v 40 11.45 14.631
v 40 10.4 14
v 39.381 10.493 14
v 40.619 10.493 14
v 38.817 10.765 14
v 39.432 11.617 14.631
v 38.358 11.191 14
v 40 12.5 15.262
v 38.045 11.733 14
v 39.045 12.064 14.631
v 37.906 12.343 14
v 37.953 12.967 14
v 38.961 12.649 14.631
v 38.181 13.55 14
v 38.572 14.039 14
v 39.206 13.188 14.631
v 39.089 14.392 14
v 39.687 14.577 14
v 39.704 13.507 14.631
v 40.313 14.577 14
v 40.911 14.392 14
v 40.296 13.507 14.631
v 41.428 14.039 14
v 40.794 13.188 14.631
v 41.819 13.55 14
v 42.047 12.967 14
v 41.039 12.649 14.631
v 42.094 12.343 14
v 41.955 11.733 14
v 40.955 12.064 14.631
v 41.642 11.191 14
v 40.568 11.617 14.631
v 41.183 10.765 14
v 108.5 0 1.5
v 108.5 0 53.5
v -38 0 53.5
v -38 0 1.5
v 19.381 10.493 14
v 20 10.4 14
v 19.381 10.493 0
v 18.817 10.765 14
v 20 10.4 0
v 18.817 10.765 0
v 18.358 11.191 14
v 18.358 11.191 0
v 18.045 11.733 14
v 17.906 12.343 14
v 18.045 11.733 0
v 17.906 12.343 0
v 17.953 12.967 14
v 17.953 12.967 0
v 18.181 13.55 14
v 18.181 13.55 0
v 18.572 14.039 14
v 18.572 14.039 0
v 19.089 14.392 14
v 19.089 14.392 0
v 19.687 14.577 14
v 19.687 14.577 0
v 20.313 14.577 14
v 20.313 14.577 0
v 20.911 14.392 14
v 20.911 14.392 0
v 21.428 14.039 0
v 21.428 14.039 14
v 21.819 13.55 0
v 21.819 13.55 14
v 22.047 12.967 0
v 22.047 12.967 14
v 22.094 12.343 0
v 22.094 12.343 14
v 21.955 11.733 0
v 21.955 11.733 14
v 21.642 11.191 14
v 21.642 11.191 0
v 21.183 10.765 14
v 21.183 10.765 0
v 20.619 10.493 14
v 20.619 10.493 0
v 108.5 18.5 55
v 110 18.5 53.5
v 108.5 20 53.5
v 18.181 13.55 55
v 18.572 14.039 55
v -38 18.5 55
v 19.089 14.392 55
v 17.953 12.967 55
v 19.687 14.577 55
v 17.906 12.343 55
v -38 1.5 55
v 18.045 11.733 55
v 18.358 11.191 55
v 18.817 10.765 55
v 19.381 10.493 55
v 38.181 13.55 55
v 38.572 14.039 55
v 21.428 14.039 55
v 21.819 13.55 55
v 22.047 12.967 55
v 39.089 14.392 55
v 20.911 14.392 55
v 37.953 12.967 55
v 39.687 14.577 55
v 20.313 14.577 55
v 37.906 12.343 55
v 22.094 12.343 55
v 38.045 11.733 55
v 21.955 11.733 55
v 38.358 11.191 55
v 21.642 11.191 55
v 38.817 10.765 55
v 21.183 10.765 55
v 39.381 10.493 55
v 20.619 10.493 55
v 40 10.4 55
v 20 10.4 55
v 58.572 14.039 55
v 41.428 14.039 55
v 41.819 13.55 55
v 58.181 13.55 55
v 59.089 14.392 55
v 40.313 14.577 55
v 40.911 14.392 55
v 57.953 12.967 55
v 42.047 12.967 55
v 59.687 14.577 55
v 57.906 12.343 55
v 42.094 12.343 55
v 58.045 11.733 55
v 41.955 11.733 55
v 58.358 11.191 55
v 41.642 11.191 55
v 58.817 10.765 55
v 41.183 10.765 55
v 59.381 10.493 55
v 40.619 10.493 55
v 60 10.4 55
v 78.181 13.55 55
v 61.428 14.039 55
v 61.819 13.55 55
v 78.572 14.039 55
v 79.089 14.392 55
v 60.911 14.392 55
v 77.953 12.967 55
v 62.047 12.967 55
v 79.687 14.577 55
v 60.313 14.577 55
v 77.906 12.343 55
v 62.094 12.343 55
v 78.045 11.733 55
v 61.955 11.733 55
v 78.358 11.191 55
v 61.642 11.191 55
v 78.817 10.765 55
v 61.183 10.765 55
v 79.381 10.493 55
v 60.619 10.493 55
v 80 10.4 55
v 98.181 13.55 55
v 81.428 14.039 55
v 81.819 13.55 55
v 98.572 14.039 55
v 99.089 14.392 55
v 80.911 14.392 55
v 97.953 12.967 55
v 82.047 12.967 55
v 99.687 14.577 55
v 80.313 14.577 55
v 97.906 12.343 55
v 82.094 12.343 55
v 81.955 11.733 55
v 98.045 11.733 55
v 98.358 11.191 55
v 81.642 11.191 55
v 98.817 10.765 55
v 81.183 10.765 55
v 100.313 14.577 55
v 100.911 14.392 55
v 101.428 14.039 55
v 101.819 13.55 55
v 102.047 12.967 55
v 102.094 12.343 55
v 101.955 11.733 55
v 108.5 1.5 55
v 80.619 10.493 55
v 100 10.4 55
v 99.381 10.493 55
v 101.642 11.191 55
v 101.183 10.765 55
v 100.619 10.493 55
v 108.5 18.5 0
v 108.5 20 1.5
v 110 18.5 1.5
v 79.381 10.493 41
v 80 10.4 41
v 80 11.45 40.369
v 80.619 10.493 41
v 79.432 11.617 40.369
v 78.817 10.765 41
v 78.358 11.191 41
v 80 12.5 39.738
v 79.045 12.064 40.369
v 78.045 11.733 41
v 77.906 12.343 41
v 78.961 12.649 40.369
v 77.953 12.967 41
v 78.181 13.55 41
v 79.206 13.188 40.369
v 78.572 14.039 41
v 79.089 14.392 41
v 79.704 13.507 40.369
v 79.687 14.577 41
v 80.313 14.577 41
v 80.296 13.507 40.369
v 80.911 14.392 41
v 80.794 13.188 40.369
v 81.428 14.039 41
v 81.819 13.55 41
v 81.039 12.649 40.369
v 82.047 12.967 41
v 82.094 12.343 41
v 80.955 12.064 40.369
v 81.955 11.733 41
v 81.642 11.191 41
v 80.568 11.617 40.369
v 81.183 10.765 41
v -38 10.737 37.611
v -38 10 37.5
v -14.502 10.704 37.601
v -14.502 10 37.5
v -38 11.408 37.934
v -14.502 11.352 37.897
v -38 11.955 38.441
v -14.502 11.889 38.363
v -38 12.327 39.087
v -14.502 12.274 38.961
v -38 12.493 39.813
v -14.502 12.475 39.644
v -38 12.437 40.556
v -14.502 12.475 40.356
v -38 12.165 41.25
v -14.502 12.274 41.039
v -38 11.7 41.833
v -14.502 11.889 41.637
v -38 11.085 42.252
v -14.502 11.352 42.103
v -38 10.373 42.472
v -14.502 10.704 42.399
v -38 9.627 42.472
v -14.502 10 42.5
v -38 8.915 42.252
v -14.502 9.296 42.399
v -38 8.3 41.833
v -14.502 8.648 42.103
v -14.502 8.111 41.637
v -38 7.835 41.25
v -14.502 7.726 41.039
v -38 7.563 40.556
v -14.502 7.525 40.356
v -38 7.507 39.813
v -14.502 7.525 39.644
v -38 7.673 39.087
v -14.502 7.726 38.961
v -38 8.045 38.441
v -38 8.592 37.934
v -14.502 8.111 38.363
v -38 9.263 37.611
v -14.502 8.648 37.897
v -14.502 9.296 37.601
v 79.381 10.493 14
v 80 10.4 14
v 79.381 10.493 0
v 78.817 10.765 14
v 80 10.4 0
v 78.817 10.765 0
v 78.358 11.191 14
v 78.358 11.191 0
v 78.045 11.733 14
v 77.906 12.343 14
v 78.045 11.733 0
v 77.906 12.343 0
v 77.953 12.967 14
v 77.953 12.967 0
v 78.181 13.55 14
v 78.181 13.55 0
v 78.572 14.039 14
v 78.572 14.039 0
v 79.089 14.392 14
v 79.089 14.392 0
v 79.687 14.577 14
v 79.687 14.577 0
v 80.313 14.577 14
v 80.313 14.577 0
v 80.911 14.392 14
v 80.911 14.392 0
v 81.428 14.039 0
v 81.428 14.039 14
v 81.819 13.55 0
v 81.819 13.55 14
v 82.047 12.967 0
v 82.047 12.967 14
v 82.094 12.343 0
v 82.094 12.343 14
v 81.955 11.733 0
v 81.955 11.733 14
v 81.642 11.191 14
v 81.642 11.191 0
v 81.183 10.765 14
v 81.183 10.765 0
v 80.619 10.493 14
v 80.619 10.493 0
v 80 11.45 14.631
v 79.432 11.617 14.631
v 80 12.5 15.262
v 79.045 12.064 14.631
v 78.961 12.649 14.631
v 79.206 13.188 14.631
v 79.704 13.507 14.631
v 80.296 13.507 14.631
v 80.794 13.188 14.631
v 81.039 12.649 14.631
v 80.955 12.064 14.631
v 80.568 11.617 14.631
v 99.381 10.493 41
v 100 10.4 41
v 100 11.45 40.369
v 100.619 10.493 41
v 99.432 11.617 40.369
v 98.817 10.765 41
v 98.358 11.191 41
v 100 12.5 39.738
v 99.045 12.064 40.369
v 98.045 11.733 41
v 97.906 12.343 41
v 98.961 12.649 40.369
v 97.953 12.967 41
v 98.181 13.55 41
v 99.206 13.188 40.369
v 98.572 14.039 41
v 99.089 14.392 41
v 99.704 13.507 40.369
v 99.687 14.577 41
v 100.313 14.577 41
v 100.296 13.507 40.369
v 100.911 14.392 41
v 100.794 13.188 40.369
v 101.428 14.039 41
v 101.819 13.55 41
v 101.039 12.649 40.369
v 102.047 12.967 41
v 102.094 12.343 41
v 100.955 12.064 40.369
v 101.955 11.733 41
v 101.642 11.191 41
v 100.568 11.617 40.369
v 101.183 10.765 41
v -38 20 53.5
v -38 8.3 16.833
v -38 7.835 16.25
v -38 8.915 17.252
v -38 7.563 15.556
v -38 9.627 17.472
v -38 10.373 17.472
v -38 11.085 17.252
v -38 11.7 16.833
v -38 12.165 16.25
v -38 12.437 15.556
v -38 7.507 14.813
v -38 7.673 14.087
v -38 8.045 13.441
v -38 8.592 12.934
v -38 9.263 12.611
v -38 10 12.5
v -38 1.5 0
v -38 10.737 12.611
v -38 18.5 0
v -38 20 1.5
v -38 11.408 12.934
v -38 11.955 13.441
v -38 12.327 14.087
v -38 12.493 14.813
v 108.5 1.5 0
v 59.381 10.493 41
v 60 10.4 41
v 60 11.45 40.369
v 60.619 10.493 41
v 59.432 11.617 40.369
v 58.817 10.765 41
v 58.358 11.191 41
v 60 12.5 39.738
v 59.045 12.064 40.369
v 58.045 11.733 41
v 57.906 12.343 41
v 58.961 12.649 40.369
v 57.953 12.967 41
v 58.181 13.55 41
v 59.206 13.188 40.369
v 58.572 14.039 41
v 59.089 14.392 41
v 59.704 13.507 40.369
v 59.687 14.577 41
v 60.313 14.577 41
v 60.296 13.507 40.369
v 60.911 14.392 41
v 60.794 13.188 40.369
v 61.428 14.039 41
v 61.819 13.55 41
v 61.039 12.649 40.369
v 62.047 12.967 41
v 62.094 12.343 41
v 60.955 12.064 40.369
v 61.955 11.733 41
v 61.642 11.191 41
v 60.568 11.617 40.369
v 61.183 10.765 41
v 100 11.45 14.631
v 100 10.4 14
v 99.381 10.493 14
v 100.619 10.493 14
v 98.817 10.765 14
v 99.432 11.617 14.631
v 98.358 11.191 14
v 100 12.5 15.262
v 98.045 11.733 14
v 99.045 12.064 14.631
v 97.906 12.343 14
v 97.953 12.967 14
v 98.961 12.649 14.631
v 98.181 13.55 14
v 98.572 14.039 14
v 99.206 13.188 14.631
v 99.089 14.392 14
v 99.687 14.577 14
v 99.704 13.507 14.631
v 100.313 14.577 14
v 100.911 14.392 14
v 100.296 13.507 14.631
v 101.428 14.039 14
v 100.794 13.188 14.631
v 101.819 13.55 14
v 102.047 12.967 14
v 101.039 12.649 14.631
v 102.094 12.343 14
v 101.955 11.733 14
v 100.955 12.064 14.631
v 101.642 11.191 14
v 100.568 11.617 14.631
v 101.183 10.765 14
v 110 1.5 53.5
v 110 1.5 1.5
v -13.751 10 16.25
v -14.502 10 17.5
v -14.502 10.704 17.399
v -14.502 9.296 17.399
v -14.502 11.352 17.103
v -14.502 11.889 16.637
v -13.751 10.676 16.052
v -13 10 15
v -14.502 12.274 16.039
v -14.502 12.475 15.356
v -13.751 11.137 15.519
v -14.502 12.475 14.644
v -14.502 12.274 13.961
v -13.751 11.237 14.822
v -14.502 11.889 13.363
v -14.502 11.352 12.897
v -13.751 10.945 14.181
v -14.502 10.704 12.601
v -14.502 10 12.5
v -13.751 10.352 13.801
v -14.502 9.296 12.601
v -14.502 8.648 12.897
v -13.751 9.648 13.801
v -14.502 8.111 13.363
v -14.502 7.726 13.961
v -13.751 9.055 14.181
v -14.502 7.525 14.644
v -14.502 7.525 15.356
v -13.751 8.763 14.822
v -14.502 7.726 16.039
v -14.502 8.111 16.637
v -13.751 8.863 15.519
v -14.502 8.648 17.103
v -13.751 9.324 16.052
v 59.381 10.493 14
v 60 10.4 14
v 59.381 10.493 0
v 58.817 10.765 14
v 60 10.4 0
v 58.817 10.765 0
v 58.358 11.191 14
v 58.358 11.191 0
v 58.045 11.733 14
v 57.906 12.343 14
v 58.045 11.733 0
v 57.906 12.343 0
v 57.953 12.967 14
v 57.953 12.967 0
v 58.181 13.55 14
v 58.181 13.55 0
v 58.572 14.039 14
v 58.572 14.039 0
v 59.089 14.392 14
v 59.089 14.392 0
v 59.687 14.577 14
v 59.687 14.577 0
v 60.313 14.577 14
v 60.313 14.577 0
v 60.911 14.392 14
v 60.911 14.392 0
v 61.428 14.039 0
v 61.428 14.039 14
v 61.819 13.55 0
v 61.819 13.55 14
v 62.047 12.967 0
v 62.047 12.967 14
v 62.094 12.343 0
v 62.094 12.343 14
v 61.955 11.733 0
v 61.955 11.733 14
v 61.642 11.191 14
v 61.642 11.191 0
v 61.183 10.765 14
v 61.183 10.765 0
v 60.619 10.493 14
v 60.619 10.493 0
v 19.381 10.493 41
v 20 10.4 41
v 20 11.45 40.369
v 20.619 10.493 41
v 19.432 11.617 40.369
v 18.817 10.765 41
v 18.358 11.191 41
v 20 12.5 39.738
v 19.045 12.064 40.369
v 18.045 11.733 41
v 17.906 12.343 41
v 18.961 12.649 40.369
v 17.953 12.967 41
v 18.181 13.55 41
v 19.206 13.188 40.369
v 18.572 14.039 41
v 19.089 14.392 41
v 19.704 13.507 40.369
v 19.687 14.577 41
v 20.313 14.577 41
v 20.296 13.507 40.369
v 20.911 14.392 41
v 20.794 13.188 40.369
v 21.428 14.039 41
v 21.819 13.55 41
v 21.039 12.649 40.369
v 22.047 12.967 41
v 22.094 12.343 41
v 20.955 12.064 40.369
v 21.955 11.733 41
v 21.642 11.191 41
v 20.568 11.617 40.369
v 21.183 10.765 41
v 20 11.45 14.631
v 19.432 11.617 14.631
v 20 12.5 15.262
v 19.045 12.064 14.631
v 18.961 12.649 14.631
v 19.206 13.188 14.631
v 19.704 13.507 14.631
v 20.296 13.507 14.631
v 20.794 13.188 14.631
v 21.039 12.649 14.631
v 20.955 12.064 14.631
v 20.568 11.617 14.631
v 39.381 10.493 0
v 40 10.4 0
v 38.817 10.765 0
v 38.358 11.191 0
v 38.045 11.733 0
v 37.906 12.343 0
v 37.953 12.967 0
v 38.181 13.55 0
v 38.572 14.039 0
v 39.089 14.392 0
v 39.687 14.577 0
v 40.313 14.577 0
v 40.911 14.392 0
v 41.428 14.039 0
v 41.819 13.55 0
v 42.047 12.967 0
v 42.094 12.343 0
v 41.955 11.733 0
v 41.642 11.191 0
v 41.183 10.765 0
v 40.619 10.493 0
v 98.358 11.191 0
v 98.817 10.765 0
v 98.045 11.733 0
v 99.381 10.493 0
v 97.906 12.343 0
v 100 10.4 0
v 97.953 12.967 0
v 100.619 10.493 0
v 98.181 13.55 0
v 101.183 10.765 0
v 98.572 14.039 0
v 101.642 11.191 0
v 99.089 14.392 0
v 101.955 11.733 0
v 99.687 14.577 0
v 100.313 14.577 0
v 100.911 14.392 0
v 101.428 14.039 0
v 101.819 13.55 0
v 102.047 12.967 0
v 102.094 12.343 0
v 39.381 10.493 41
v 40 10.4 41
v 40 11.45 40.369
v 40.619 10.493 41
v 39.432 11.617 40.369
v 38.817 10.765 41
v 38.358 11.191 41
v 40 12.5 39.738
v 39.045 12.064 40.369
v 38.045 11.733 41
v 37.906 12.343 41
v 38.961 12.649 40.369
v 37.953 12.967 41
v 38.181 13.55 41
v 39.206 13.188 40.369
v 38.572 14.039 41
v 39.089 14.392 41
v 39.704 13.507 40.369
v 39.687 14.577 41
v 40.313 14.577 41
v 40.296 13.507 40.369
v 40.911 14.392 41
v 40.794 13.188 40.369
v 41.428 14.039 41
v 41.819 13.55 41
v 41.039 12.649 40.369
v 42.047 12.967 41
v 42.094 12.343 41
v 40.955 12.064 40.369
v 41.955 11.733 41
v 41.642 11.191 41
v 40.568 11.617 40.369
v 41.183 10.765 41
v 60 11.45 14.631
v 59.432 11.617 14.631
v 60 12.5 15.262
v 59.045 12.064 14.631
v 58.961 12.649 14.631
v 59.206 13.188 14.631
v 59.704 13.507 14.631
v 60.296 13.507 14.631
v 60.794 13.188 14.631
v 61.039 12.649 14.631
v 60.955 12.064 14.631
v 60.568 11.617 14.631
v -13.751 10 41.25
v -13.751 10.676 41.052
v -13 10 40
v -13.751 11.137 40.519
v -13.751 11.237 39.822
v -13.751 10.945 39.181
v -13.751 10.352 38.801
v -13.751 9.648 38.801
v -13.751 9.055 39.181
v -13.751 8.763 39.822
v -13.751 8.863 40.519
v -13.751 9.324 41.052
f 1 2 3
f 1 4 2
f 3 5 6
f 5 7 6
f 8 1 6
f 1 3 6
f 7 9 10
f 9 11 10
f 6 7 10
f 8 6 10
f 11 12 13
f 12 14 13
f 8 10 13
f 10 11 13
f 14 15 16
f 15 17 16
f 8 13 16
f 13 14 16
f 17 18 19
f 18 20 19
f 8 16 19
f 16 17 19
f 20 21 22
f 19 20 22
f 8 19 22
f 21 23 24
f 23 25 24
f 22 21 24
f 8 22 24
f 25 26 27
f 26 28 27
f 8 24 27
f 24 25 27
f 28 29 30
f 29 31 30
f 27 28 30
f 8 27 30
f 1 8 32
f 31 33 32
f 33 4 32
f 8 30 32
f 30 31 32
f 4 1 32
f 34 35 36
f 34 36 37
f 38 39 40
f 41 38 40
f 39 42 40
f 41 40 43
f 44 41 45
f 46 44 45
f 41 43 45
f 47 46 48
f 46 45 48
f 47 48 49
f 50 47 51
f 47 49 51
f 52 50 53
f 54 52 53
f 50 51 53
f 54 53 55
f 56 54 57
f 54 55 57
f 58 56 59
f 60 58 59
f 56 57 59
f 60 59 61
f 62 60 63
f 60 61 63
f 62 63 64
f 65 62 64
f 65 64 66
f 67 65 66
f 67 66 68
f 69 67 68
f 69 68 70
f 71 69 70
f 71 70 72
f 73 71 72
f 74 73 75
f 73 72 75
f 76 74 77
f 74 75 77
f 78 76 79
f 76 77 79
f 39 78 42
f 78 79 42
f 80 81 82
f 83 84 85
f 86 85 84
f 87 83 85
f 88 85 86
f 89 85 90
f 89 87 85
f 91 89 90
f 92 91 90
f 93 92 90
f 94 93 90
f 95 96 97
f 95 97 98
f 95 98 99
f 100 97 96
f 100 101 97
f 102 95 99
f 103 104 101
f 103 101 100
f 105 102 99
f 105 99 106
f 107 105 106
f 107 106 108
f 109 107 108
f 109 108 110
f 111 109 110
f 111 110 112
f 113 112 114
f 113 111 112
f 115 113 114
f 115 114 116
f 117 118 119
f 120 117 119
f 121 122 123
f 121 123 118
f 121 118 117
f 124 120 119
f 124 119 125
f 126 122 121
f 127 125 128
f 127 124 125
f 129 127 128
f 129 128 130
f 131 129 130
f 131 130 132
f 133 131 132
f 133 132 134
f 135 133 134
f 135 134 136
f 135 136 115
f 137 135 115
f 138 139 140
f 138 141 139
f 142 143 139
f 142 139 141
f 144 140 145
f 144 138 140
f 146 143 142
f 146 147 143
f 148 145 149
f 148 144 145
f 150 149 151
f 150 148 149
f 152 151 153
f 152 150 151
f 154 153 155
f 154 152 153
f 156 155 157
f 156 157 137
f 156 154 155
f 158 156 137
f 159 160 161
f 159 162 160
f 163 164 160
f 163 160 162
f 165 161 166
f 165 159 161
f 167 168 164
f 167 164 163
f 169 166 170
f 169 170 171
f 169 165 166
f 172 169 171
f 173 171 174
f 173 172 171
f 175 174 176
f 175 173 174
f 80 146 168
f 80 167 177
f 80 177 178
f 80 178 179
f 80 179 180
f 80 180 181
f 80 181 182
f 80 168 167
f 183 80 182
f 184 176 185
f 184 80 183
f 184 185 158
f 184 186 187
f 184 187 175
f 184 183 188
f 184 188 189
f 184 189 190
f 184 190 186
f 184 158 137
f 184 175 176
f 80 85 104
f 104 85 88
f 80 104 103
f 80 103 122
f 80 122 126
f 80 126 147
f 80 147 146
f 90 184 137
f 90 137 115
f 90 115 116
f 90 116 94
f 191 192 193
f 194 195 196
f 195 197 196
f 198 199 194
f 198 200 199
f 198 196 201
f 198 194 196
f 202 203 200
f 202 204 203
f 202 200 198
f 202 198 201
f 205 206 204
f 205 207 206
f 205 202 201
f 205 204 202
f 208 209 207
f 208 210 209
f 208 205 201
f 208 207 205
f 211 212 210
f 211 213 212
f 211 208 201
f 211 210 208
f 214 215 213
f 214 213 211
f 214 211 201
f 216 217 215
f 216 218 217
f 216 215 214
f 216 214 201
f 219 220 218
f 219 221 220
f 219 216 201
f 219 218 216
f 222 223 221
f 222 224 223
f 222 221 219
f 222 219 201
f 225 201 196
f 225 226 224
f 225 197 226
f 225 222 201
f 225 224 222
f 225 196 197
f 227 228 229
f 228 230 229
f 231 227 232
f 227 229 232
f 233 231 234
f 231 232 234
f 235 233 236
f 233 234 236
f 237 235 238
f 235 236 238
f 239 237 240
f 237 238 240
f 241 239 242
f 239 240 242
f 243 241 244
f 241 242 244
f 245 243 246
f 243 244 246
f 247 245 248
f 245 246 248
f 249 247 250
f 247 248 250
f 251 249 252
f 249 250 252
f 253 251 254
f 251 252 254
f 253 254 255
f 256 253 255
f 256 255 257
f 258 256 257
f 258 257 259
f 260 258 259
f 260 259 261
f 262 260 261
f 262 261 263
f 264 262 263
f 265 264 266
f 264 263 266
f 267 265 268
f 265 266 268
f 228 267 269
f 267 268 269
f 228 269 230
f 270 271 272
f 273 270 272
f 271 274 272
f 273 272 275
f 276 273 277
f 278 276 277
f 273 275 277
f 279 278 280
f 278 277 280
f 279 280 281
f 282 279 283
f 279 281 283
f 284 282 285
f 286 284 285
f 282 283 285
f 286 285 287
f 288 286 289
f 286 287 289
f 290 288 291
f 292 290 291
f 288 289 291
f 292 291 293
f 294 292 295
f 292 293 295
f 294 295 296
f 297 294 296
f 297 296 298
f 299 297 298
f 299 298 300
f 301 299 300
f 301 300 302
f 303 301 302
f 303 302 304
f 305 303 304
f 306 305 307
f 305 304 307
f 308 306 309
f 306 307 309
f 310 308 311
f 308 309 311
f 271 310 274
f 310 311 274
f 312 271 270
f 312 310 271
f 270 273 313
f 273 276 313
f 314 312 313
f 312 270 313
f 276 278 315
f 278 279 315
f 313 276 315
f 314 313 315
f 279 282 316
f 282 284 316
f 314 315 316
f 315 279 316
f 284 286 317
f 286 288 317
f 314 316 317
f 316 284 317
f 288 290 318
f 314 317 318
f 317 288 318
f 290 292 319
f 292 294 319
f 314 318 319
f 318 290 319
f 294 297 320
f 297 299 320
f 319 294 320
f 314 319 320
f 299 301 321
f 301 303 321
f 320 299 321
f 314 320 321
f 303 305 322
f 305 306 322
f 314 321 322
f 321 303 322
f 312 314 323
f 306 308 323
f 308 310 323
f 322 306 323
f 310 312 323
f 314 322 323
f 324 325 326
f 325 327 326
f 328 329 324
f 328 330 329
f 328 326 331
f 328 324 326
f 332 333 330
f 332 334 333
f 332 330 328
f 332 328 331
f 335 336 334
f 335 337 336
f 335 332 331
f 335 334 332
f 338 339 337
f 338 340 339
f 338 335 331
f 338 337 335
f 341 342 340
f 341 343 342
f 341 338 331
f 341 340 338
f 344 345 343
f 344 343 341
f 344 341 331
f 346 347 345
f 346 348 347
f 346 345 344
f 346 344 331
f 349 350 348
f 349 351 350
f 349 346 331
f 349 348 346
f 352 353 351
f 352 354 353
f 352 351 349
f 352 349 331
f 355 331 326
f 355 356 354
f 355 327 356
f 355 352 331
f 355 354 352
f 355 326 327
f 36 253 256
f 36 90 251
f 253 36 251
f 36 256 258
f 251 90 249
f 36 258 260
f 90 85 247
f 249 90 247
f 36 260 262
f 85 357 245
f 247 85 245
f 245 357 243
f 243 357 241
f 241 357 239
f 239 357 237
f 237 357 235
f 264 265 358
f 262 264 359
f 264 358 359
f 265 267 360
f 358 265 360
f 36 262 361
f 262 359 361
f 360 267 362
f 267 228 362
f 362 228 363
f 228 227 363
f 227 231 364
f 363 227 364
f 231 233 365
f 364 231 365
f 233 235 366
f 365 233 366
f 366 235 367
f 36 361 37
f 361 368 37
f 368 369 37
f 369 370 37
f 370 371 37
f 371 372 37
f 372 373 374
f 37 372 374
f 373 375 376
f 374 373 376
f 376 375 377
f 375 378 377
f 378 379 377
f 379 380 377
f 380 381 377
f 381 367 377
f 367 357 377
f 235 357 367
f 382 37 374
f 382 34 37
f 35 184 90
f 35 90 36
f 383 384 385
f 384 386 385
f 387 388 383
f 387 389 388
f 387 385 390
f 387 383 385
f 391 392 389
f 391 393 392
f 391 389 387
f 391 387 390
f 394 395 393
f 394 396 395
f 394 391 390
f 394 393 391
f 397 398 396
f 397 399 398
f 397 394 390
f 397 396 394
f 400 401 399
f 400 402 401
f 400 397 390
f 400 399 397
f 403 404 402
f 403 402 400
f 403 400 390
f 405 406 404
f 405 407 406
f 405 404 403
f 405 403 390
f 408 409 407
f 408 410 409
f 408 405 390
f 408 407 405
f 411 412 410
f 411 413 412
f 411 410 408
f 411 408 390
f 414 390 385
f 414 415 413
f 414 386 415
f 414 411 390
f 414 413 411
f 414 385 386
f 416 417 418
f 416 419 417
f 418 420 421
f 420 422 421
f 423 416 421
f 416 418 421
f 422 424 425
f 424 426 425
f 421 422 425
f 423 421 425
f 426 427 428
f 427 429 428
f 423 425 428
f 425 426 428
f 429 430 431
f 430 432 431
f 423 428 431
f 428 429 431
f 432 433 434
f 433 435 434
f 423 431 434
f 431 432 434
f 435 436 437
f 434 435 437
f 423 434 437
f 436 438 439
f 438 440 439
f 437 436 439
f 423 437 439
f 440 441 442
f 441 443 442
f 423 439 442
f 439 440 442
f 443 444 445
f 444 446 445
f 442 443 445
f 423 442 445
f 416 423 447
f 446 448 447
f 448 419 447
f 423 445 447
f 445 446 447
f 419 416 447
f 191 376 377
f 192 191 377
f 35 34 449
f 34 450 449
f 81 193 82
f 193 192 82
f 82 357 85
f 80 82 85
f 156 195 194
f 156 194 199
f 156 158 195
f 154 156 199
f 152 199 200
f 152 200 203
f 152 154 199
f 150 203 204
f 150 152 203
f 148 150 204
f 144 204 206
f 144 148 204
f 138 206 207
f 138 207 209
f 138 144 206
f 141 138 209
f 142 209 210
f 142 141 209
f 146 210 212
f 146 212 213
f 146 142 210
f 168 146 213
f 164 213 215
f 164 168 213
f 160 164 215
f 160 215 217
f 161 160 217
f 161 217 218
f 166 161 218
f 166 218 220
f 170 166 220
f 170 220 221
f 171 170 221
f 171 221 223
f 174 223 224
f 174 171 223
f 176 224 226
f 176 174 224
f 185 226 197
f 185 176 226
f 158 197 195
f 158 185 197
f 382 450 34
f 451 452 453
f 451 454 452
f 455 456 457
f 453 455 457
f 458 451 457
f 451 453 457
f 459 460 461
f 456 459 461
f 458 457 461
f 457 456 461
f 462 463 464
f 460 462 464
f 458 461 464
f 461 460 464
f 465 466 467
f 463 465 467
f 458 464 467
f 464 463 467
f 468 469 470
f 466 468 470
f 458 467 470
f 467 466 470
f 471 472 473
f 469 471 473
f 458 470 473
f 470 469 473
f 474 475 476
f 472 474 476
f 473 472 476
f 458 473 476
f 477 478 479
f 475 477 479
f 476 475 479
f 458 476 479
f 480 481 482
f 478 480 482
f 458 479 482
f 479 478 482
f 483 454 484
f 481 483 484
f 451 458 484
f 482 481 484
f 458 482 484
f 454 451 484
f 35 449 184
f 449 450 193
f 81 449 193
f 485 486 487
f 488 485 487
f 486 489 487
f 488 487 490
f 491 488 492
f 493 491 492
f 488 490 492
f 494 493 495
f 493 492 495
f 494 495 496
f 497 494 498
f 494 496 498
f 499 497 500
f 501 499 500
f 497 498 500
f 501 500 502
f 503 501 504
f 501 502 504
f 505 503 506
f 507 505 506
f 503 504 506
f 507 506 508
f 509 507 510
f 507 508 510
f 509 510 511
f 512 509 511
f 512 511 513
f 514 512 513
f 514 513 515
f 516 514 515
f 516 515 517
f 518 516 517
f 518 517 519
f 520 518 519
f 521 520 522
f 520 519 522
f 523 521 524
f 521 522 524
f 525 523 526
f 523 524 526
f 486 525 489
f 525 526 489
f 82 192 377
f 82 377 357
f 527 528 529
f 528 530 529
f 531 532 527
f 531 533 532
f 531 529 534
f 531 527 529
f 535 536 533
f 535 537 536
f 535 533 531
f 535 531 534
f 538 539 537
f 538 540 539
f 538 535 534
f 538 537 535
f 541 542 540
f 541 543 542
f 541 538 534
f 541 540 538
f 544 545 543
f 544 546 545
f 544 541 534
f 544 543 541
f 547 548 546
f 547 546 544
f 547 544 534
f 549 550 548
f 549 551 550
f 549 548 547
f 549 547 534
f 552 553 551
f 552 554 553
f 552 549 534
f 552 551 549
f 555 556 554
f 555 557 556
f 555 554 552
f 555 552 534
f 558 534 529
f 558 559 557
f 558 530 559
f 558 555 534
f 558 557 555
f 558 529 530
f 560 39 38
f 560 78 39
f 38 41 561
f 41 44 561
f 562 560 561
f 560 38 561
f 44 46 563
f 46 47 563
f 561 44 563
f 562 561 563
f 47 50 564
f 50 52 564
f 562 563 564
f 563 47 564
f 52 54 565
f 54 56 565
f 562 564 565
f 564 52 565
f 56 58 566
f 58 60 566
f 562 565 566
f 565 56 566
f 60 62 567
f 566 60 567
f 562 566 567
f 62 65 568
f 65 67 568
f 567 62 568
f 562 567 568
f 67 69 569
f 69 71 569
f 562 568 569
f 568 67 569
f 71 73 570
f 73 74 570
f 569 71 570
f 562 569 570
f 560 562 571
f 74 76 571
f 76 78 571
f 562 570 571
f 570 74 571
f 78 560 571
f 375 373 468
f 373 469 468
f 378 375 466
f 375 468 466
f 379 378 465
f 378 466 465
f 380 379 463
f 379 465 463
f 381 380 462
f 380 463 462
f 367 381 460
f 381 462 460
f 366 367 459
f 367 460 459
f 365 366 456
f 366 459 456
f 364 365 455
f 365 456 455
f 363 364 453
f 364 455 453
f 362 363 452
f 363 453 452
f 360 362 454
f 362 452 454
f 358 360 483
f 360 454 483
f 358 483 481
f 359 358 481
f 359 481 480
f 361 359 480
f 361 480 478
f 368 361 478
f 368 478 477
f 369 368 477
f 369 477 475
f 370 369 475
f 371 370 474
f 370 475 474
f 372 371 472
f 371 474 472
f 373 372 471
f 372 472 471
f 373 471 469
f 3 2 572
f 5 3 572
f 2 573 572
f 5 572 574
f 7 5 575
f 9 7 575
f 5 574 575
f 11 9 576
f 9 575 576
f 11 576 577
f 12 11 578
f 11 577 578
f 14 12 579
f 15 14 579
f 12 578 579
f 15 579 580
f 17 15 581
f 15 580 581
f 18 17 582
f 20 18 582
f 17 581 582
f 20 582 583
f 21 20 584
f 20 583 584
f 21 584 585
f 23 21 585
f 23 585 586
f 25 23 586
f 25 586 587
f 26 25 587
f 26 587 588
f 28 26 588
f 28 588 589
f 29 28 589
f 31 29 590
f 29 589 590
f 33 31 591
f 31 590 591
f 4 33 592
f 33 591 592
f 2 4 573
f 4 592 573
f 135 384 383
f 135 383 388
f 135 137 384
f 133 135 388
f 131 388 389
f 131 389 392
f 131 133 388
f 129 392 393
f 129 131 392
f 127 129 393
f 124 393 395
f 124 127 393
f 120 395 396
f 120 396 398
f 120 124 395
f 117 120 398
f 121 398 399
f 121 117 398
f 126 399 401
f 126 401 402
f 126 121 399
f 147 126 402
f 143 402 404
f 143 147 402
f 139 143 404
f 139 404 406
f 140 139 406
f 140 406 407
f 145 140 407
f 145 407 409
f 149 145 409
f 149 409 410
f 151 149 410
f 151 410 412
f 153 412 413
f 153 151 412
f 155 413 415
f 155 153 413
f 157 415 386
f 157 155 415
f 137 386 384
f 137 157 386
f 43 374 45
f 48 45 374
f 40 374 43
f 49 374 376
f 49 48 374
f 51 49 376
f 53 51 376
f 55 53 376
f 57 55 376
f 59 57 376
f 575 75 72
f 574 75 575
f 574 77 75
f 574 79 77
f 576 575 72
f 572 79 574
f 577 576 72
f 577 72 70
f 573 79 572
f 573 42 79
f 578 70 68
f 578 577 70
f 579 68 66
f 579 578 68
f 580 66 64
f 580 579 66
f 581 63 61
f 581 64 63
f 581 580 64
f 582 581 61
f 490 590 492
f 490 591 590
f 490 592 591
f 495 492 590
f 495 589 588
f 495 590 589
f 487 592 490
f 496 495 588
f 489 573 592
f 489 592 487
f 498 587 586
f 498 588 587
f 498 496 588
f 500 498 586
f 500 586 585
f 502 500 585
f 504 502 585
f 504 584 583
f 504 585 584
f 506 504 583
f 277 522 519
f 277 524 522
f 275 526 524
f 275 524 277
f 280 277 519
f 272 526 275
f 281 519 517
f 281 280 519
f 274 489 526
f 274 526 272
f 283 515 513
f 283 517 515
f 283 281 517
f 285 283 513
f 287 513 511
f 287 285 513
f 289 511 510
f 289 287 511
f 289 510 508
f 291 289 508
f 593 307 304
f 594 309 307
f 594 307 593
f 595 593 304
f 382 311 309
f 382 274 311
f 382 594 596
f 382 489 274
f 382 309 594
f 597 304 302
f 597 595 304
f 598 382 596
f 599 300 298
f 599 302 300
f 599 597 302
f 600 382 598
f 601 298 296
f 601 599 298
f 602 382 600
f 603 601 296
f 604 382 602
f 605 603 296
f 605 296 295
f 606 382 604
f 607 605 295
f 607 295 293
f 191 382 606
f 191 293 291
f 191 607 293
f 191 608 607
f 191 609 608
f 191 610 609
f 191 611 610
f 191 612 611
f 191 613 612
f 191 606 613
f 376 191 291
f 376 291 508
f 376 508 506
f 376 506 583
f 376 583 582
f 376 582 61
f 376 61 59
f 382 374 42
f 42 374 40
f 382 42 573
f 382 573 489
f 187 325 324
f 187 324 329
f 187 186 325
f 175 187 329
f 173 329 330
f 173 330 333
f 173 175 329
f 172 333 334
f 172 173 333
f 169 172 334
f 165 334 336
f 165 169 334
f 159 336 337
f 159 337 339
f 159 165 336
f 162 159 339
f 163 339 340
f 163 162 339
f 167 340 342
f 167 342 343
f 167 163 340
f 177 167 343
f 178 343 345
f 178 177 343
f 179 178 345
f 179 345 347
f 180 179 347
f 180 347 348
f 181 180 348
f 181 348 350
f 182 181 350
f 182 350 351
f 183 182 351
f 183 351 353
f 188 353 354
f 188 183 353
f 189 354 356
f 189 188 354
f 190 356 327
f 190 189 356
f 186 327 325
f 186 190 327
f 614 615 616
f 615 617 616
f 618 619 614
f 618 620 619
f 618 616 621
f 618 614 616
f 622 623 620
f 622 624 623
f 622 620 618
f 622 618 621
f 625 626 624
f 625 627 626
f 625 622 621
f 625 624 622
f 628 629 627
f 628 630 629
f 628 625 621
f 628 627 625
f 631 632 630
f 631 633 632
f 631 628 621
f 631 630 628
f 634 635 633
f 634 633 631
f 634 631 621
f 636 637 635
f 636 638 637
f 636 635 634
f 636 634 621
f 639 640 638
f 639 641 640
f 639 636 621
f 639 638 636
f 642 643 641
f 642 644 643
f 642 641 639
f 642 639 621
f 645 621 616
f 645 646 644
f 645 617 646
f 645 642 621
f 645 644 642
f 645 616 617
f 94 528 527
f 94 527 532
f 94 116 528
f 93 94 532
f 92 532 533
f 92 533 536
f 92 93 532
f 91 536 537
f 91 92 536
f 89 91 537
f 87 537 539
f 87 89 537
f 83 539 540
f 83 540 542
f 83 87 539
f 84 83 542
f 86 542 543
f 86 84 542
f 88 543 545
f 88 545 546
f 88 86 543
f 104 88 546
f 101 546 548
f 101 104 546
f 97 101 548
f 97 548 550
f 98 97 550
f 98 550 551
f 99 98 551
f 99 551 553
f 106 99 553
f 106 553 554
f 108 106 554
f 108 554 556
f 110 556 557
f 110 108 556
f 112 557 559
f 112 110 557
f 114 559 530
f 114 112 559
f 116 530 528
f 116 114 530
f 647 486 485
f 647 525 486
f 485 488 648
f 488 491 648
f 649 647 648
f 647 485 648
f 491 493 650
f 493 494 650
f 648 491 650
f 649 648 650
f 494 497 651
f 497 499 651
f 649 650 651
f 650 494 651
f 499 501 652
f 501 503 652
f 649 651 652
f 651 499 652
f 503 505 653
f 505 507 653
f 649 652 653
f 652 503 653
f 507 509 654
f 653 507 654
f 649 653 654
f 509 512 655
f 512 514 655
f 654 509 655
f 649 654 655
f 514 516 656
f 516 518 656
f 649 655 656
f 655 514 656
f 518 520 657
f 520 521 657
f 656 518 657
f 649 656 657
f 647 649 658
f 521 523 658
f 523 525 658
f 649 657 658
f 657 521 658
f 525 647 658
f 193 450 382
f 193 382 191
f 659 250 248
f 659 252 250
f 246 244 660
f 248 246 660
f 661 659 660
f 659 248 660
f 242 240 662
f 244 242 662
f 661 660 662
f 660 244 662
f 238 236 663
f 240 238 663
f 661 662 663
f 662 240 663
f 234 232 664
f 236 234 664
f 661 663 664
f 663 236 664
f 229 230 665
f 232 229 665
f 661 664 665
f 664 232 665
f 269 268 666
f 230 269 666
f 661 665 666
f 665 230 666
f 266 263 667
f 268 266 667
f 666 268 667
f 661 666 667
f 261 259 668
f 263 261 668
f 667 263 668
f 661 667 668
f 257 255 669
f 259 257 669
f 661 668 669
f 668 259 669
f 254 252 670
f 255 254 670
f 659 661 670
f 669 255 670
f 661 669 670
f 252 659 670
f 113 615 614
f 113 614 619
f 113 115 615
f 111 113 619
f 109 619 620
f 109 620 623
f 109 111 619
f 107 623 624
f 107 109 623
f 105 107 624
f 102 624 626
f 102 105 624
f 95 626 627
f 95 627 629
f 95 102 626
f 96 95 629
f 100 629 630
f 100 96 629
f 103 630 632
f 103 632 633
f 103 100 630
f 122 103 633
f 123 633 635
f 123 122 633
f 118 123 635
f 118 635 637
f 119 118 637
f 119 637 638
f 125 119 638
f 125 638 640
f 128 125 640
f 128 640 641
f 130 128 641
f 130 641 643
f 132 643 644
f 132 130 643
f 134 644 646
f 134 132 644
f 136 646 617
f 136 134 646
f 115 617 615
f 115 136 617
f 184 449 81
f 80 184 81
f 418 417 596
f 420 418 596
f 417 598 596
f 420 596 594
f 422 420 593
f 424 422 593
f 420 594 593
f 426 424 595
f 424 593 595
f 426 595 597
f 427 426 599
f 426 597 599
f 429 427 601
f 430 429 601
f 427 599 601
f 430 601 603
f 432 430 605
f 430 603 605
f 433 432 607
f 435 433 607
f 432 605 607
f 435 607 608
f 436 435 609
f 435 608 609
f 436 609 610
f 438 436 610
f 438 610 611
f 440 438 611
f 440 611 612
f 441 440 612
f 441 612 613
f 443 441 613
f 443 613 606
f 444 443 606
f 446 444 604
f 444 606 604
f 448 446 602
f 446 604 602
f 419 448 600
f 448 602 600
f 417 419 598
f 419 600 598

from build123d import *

# Parameters (mm, degrees)
BOSS_EXTRUDE1_DEPTH        = 55
SKETCH2_W                  = 5
SKETCH2_H                  = 70
BOSS_EXTRUDE2_DEPTH        = 5
M5_TAPPED_HOLE1_AT_2_COUNT = 2
M5_TAPPED_HOLE1_AT_2_PITCH = 20
M5_TAPPED_HOLE1_AT_3_COUNT = 2
M5_TAPPED_HOLE1_AT_3_PITCH = 40
M5_TAPPED_HOLE1_AT_4_COUNT = 2
M5_TAPPED_HOLE1_AT_4_PITCH = 60
M5_TAPPED_HOLE1_AT_5_COUNT = 2
M5_TAPPED_HOLE1_AT_5_PITCH = 80
CUT_EXTRUDE1_DEPTH         = 126
SKETCH9_W                  = 55
SKETCH9_H                  = 20
BOSS_EXTRUDE3_DEPTH        = 5
CHAMFER1_SIZE              = 1.5
BOSS_EXTRUDE4_DEPTH        = 50
M6_TAPPED_HOLE2_D          = 5
M6_TAPPED_HOLE2_DEPTH      = 23.497848452
M6_TAPPED_HOLE2_TIP        = 1.502151548


with BuildPart() as part:
    # Sketch1 → Boss-Extrude1 (new body)
    with BuildSketch(Plane.XY):
        Polygon((0, 0), (110, 0), (110, 20), (20, 20), (20, 70), (0, 70), align=None)
    extrude(amount=BOSS_EXTRUDE1_DEPTH)

    # Sketch2 → Boss-Extrude2 (add)
    with BuildSketch(Plane.ZY):
        with Locations((52.5, 35)):
            Rectangle(SKETCH2_W, SKETCH2_H)
        with Locations((2.5, 35)):
            Rectangle(SKETCH2_W, SKETCH2_H)
    extrude(amount=BOSS_EXTRUDE2_DEPTH)

    # Sketch4 → M5 Tapped Hole1 (revolve, cut)
    with BuildSketch(Plane(origin=(100, 12.5, 55), x_dir=(0, -1, 0), z_dir=(1, 0, 0))):
        Polygon((0, 0), (0, 15.2618073), (2.1, 14), (2.1, 0), align=None)
    m5_tapped_hole1 = revolve(axis=Axis((100, 12.5, 61.35), (0, 0, -1)), mode=Mode.SUBTRACT)

    # M5 Tapped Hole1 at 2: M5 Tapped Hole1 ×2
    with Locations(*[(-i * M5_TAPPED_HOLE1_AT_2_PITCH, 0, 0) for i in range(1, M5_TAPPED_HOLE1_AT_2_COUNT)]):
        add(m5_tapped_hole1, mode=Mode.SUBTRACT)

    # M5 Tapped Hole1 at 3: M5 Tapped Hole1 ×2
    with Locations(*[(-i * M5_TAPPED_HOLE1_AT_3_PITCH, 0, 0) for i in range(1, M5_TAPPED_HOLE1_AT_3_COUNT)]):
        add(m5_tapped_hole1, mode=Mode.SUBTRACT)

    # M5 Tapped Hole1 at 4: M5 Tapped Hole1 ×2
    with Locations(*[(-i * M5_TAPPED_HOLE1_AT_4_PITCH, 0, 0) for i in range(1, M5_TAPPED_HOLE1_AT_4_COUNT)]):
        add(m5_tapped_hole1, mode=Mode.SUBTRACT)

    # M5 Tapped Hole1 at 5: M5 Tapped Hole1 ×2
    with Locations(*[(-i * M5_TAPPED_HOLE1_AT_5_PITCH, 0, 0) for i in range(1, M5_TAPPED_HOLE1_AT_5_COUNT)]):
        add(m5_tapped_hole1, mode=Mode.SUBTRACT)

    # Mirror1: M5 Tapped Hole1 across plane
    add(m5_tapped_hole1.mirror(Plane.XY.offset(27.5)), mode=Mode.SUBTRACT)

    # Mirror1 copy 1 sketch → Mirror1 copy 1 (revolve, cut)
    with BuildSketch(Plane(origin=(80, 12.5, 0), x_dir=(0, -1, 0), z_dir=(1, 0, 0))):
        Polygon((0, 0), (0, -15.2618073), (2.1, -14), (2.1, 0), align=None)
    revolve(axis=Axis((80, 12.5, -6.35), (0, 0, -1)), mode=Mode.SUBTRACT)

    # Mirror1 copy 2 sketch → Mirror1 copy 2 (revolve, cut)
    with BuildSketch(Plane(origin=(60, 12.5, 0), x_dir=(0, -1, 0), z_dir=(1, 0, 0))):
        Polygon((0, 0), (0, -15.2618073), (2.1, -14), (2.1, 0), align=None)
    revolve(axis=Axis((60, 12.5, -6.35), (0, 0, -1)), mode=Mode.SUBTRACT)

    # Mirror1 copy 3 sketch → Mirror1 copy 3 (revolve, cut)
    with BuildSketch(Plane(origin=(40, 12.5, 0), x_dir=(0, -1, 0), z_dir=(1, 0, 0))):
        Polygon((0, 0), (0, -15.2618073), (2.1, -14), (2.1, 0), align=None)
    revolve(axis=Axis((40, 12.5, -6.35), (0, 0, -1)), mode=Mode.SUBTRACT)

    # Mirror1 copy 4 sketch → Mirror1 copy 4 (revolve, cut)
    with BuildSketch(Plane(origin=(20, 12.5, 0), x_dir=(0, -1, 0), z_dir=(1, 0, 0))):
        Polygon((0, 0), (0, -15.2618073), (2.1, -14), (2.1, 0), align=None)
    revolve(axis=Axis((20, 12.5, -6.35), (0, 0, -1)), mode=Mode.SUBTRACT)

    # Sketch8 → Cut-Extrude1 (cut)
    with BuildSketch(Plane.XY.offset(55)):
        Polygon((17, 20), (17, 0), (-5, 0), (-5, 70), (20, 70), (20, 20), align=None)
    extrude(amount=-CUT_EXTRUDE1_DEPTH, mode=Mode.SUBTRACT)

    # Sketch9 → Boss-Extrude3 (add)
    with BuildSketch(Plane.ZY.offset(-17)):
        with Locations((27.5, 10)):
            Rectangle(SKETCH9_W, SKETCH9_H)
    extrude(amount=BOSS_EXTRUDE3_DEPTH)

    # Chamfer1
    chamfer1_edges = [part.edges().sort_by_distance(p)[0] for p in [
        (110, 20, 27.5),
        (110, 0, 27.5),
        (110, 10, 55),
        (61, 20, 55),
        (61, 20, 0),
        (110, 10, 0),
        (61, 0, 0),
        (61, 0, 55),
    ]]
    chamfer(chamfer1_edges, length=CHAMFER1_SIZE)

    # Sketch10 → Boss-Extrude4 (add)
    with BuildSketch(Plane.ZY.offset(-12)):
        Polygon((0, 18.5), (1.5, 20), (53.5, 20), (55, 18.5), (55, 1.5), (53.5, 0), (1.5, 0), (0, 1.5), align=None)
    extrude(amount=BOSS_EXTRUDE4_DEPTH)

    # M6 Tapped Hole2
    with Locations(Plane.ZY.offset(38)):
        with Locations((15, 10), (40, 10)):
            Hole(M6_TAPPED_HOLE2_D / 2, depth=M6_TAPPED_HOLE2_DEPTH)
            with Locations((0, 0, -(M6_TAPPED_HOLE2_DEPTH + M6_TAPPED_HOLE2_TIP / 2))):  # 118° drill point
                Cone(0, M6_TAPPED_HOLE2_D / 2, M6_TAPPED_HOLE2_TIP, mode=Mode.SUBTRACT)


solid = part.part
